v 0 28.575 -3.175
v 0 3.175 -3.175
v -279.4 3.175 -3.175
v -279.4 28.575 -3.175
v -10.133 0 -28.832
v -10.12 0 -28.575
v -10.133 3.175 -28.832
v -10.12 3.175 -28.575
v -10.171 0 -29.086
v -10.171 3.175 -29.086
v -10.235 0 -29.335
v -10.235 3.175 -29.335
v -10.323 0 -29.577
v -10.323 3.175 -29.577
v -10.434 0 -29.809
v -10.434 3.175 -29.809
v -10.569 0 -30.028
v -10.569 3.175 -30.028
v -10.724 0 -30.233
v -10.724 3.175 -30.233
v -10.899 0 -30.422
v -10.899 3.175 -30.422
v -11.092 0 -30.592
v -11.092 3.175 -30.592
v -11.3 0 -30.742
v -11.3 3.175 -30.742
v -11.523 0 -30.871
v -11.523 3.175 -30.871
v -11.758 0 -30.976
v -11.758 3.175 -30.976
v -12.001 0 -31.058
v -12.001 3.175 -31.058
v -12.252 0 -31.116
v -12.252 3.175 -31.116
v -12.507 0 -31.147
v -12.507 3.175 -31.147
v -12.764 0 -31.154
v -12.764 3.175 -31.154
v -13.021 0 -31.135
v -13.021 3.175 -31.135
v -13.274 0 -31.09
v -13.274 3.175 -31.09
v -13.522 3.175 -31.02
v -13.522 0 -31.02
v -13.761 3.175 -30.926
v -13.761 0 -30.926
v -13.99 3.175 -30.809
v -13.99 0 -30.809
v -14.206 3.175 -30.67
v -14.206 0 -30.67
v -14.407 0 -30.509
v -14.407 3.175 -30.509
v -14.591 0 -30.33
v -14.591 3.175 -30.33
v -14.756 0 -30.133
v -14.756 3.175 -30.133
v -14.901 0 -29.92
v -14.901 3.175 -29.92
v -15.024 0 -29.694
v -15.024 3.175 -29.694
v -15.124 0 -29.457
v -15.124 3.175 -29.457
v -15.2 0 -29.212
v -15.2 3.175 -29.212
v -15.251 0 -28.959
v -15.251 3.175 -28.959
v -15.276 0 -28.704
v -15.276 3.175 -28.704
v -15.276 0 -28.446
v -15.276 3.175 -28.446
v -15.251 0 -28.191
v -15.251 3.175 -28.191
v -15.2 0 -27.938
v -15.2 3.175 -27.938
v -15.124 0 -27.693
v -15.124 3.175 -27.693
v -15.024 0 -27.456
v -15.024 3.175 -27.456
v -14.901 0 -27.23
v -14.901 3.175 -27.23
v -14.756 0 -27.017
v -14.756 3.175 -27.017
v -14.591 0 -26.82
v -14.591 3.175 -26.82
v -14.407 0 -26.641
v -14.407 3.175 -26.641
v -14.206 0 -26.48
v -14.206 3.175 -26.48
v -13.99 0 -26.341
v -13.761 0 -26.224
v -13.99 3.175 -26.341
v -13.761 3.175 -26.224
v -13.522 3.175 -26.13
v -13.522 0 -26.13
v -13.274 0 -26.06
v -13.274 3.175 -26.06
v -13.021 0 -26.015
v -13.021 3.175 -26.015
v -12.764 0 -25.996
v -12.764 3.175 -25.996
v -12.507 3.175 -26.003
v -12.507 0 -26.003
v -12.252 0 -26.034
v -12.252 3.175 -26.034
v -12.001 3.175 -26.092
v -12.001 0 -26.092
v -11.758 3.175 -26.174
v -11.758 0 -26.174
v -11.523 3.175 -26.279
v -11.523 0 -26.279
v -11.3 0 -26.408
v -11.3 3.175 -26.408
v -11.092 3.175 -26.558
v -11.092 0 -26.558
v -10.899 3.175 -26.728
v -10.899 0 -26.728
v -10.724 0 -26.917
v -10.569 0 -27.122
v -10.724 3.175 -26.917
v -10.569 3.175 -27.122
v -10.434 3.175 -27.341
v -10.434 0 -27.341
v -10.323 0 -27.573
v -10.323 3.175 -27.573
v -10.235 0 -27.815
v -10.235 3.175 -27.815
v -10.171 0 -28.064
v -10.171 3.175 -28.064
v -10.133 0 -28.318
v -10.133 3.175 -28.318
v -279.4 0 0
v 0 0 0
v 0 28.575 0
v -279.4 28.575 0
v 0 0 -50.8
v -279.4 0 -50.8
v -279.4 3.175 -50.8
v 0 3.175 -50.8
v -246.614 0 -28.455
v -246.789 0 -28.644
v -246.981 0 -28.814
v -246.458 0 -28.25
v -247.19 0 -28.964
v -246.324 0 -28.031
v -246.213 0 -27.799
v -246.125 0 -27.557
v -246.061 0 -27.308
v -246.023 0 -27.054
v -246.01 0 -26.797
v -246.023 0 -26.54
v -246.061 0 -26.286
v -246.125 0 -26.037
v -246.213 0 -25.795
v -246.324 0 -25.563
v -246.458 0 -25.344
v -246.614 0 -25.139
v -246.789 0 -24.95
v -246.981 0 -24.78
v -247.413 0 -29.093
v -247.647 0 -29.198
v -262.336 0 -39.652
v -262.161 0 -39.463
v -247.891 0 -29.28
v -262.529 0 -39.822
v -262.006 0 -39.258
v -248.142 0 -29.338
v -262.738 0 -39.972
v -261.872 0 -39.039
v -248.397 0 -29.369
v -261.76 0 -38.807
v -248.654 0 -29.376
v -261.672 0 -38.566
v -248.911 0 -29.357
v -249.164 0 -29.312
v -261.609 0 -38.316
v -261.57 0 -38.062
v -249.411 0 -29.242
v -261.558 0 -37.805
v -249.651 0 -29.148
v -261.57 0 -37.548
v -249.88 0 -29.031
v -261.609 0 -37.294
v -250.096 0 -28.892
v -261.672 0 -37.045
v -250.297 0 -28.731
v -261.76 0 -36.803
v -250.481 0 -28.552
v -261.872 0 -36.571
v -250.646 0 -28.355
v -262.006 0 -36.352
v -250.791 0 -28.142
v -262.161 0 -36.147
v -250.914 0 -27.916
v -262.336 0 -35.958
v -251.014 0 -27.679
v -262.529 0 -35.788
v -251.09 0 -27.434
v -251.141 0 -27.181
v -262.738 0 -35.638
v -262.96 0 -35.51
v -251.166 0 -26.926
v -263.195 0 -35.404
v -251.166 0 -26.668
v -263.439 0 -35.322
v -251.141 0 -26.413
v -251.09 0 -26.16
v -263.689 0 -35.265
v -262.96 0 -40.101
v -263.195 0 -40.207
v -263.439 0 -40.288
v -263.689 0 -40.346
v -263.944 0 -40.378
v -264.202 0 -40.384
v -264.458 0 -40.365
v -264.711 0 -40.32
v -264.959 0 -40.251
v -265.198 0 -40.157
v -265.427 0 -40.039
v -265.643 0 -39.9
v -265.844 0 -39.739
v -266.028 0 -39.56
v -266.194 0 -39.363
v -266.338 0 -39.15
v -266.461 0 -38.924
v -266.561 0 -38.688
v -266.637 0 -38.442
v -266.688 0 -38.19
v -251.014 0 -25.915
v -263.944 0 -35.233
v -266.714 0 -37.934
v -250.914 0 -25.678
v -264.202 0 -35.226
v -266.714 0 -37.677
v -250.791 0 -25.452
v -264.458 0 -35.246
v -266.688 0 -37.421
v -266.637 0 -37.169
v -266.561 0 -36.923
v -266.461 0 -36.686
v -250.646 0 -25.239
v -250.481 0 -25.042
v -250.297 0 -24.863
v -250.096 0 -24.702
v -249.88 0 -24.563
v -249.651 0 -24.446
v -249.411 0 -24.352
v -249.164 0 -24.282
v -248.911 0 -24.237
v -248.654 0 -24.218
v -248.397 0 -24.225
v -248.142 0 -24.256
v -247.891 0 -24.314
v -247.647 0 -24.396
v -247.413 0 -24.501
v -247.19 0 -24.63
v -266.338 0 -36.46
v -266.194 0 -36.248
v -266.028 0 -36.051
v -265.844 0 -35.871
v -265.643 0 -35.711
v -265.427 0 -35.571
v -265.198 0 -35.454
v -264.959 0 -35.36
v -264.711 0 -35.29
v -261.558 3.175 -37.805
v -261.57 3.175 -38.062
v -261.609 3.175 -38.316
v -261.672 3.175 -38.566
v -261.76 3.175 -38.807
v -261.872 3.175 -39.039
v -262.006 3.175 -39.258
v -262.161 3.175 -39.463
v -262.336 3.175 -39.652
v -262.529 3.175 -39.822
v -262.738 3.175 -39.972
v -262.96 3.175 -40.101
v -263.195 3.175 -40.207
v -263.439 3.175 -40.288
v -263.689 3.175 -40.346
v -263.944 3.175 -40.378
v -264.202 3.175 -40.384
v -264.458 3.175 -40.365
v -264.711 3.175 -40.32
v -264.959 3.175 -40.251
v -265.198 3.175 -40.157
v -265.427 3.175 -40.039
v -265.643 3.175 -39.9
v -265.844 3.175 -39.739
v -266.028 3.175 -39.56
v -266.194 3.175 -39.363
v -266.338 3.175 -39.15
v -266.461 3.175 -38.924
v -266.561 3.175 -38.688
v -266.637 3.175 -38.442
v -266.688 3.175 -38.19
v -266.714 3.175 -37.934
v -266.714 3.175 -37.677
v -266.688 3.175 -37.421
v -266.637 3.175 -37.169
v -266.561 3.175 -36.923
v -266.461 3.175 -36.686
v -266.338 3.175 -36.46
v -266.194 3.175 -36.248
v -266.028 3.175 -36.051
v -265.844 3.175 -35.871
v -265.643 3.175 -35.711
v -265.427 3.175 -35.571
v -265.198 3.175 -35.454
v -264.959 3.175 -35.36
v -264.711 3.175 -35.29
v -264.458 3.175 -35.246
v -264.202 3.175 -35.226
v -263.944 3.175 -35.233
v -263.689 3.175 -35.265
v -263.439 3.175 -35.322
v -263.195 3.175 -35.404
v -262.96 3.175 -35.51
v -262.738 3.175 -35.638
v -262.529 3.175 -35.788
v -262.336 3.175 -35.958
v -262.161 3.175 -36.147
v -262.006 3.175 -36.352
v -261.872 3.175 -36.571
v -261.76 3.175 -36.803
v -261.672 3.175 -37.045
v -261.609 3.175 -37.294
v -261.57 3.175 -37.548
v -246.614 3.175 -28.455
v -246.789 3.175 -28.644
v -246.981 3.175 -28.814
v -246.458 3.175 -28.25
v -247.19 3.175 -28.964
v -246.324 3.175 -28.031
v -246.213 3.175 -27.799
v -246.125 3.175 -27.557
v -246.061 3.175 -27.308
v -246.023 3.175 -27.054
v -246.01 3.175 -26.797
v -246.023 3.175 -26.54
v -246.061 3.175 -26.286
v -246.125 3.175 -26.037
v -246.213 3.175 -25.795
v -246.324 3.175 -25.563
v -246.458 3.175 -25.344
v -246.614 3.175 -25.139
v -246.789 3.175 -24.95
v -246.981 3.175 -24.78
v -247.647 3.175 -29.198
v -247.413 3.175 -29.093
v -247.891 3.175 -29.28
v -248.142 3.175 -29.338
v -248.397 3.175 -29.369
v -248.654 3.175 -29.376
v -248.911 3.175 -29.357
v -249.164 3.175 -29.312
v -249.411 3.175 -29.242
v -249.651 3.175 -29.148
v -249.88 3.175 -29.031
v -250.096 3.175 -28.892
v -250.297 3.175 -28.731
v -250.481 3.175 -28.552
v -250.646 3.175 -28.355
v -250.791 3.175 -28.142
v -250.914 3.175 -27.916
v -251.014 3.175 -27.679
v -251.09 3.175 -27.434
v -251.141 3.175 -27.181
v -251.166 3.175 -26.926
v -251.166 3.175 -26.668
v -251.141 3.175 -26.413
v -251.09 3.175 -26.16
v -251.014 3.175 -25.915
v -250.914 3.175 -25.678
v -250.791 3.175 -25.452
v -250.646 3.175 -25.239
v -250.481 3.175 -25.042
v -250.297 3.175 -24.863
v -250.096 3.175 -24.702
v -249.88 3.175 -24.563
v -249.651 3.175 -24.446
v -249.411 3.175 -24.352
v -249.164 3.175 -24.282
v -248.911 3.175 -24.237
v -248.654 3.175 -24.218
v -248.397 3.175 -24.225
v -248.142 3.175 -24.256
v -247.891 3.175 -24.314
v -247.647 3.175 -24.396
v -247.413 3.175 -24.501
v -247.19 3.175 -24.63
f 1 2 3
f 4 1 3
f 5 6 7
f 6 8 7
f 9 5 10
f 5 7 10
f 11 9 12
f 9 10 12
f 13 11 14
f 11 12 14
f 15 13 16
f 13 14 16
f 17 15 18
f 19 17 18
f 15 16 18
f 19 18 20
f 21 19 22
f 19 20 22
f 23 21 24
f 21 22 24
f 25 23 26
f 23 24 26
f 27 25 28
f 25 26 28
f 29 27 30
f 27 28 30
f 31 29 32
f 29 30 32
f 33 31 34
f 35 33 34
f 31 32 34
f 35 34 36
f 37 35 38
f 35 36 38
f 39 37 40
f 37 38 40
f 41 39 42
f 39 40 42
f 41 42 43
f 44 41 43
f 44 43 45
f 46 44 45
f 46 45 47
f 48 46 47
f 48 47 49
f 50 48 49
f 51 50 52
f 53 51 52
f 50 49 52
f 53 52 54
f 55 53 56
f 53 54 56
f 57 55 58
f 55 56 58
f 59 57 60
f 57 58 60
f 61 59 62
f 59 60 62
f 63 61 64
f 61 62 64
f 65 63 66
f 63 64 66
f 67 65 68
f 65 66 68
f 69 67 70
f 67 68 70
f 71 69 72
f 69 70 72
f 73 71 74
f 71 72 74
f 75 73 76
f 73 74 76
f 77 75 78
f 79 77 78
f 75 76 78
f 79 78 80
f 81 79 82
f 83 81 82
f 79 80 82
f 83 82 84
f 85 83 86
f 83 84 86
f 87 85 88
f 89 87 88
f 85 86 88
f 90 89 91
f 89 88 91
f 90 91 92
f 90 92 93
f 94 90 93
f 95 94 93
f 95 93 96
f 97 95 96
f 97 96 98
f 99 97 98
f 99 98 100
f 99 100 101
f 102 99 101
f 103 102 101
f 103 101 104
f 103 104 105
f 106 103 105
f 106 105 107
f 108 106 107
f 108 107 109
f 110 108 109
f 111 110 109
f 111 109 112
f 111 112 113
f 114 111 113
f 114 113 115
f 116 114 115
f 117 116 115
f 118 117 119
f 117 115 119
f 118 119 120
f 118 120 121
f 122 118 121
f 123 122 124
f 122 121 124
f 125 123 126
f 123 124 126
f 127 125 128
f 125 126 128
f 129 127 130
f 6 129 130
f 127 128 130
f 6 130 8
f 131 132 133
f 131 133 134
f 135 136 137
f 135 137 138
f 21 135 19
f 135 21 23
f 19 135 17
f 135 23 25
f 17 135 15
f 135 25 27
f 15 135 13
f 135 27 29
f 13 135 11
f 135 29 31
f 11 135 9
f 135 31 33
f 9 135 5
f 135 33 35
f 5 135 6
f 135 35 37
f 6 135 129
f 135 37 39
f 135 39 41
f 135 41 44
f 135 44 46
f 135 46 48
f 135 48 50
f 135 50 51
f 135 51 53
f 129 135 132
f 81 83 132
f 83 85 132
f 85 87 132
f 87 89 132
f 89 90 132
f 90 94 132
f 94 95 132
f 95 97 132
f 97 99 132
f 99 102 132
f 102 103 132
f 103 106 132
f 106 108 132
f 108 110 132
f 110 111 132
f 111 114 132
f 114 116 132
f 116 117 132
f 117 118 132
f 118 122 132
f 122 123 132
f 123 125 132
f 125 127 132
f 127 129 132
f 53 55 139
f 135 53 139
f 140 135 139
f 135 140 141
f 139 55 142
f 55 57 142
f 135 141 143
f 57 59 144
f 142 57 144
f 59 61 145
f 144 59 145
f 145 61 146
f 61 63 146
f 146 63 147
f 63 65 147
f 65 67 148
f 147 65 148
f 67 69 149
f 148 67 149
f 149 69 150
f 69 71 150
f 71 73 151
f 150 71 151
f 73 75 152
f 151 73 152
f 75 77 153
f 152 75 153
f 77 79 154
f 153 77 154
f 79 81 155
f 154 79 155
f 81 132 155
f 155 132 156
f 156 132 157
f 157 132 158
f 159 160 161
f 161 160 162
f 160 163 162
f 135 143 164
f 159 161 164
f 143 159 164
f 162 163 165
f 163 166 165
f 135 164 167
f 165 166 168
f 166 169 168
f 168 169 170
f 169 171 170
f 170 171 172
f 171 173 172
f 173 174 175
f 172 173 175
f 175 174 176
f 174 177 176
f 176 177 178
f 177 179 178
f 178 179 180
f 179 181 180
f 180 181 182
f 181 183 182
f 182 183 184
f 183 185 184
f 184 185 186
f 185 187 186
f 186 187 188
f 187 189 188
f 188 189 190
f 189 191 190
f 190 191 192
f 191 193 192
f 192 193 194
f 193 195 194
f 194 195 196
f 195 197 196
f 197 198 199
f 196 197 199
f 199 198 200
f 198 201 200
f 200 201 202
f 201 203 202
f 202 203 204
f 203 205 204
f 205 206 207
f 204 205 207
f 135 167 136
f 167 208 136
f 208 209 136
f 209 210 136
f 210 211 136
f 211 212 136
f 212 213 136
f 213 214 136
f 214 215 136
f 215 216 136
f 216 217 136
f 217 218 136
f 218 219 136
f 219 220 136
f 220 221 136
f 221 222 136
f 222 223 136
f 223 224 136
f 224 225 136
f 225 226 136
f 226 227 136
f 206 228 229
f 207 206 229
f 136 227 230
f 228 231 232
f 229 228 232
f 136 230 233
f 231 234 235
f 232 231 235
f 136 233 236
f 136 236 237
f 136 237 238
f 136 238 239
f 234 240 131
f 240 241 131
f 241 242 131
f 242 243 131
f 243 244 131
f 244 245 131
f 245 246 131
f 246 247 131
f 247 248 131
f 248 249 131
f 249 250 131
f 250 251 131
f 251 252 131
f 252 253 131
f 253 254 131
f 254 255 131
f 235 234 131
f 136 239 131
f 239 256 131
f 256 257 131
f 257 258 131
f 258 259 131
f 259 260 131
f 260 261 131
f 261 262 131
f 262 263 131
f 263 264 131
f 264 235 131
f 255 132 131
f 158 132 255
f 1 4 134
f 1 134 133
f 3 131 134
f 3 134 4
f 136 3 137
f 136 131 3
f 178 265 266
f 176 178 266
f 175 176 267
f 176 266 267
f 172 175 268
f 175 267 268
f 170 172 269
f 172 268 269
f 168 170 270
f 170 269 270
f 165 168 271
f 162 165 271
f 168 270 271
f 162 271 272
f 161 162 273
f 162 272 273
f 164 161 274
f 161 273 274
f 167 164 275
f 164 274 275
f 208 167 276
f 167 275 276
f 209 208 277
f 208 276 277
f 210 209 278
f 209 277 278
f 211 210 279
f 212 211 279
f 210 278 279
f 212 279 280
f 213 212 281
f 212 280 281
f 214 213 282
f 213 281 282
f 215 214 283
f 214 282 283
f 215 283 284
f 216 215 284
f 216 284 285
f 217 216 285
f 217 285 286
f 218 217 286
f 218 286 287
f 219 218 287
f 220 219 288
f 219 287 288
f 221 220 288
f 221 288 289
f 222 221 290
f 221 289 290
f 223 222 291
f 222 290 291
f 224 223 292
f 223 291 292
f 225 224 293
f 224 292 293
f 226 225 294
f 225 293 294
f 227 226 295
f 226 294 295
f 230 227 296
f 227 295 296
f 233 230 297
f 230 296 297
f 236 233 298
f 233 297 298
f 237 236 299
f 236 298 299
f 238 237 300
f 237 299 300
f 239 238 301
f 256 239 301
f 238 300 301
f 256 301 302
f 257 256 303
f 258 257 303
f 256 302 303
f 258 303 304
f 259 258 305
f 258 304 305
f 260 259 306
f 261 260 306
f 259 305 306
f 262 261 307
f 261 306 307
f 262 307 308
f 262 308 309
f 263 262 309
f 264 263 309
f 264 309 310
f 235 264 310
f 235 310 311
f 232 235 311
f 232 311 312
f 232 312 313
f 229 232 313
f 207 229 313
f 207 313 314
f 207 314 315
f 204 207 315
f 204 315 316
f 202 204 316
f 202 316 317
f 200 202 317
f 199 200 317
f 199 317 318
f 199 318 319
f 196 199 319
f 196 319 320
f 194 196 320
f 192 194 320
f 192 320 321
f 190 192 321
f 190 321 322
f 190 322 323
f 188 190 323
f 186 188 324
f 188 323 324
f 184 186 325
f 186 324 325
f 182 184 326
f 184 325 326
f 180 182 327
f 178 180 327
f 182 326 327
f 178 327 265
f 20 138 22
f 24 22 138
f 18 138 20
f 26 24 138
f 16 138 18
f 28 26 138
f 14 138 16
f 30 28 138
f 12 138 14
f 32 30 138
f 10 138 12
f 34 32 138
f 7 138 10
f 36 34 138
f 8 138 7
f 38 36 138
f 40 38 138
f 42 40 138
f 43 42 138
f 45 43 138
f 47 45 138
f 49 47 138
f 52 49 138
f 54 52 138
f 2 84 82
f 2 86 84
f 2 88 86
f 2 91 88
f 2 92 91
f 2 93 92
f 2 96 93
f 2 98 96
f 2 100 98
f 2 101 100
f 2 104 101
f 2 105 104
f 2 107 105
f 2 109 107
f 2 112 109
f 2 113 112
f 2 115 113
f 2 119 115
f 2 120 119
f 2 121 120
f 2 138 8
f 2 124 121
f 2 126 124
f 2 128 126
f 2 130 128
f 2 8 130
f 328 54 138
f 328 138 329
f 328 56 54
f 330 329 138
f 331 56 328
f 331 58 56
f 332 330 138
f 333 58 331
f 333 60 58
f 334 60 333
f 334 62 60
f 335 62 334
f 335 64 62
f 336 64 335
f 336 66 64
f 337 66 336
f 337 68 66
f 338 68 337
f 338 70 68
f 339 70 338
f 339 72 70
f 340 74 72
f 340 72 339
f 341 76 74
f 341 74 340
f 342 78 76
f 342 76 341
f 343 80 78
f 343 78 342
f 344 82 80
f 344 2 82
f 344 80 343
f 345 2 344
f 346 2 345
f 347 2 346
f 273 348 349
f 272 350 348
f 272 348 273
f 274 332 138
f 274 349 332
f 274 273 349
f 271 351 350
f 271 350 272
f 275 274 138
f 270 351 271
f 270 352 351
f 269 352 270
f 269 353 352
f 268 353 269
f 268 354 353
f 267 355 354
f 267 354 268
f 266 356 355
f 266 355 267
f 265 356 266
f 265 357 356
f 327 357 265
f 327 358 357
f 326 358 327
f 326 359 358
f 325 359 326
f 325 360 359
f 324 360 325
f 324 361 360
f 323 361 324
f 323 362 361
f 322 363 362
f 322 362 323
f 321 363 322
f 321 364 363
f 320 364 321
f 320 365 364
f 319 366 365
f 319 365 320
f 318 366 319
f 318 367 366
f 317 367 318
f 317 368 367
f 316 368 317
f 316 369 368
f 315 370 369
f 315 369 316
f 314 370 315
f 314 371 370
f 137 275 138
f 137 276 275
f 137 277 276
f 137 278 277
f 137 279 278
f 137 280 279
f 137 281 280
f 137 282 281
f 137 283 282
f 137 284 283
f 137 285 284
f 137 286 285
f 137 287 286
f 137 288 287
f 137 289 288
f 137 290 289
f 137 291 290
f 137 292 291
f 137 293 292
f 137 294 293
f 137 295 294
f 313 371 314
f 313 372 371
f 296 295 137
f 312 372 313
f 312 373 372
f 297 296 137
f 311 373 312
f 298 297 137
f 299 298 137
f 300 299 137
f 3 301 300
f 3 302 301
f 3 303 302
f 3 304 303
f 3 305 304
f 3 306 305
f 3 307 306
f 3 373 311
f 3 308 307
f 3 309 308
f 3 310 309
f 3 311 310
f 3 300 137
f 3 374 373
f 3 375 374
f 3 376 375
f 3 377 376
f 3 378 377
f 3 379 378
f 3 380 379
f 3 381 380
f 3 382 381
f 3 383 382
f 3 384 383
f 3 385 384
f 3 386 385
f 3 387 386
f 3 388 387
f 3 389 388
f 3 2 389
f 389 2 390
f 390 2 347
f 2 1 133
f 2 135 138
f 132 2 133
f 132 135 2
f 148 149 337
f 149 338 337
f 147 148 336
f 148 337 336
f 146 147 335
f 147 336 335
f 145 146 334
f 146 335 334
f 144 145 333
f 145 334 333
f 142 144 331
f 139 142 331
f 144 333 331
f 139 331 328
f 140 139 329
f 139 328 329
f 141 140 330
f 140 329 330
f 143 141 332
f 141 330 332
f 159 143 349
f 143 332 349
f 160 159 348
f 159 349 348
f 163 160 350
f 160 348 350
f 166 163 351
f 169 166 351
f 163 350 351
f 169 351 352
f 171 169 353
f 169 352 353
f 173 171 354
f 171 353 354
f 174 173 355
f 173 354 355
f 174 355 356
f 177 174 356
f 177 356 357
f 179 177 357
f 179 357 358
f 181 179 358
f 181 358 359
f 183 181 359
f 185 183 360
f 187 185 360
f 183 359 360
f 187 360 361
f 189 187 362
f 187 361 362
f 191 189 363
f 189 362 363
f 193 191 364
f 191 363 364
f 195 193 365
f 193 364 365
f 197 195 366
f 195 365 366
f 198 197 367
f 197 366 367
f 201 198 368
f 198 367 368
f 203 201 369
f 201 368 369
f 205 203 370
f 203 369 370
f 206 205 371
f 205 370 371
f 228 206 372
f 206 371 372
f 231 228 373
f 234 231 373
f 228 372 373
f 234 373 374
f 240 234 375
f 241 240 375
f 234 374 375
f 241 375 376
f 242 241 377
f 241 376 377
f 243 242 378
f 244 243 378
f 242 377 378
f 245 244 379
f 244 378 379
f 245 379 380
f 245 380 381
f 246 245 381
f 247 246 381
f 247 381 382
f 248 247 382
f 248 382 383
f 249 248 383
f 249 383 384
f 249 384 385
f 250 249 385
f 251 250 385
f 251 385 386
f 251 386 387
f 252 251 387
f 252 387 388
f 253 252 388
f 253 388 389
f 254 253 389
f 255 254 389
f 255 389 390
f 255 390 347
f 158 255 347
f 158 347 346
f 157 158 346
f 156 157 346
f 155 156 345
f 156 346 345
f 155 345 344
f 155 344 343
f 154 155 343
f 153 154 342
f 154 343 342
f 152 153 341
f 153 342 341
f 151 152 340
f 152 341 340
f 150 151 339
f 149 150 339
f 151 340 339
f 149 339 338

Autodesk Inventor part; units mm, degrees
ref_plane "YZ Plane" through (0, 0, 0) normal (1, 0, 0) x (0, 1, 0)
ref_plane "XZ Plane" through (0, 0, 0) normal (0, 1, 0) x (-1, 0, 0)
ref_plane "XY Plane" through (0, 0, 0) normal (0, 0, 1) x (1, 0, 0)
sketch "Sketch1" plane through (0, 0, 0) normal (0, 1, 0) x (-1, 0, 0)
  line L0 (0, 0) -> (279.4, 0)
  line L1 (279.4, 0) -> (279.4, -50.8)
  line L2 (279.4, -50.8) -> (0, -50.8)
  line L3 (0, -50.8) -> (0, 0)
  dimension "d0" = 279.4
  dimension "d1" = 50.8
extrude "Extrusion1" add sketch "Sketch1" along normal blind 3.175
sketch "Sketch2" plane through (0, 3.175, 0) normal (0, 1, 0) x (1, 0, 0)
  line L0 (-279.4, 0) -> (0, 0) projected
  line L1 (-279.4, 0) -> (0, 0)
  line L2 (0, 0) -> (0, 3.175)
  line L3 (0, 3.175) -> (-279.4, 3.175)
  line L4 (-279.4, 3.175) -> (-279.4, 0)
  dimension "d4" = 279.4
  dimension "d5" = 3.175
extrude "Extrusion2" add sketch "Sketch2" along normal blind 25.4
sketch "Sketch3" plane through (0, 3.175, 0) normal (0, 1, 0) x (1, 0, 0)
  line L0 (0, 3.175) -> (0, 50.8) construction
  line L1 (0, 50.8) -> (-279.4, 50.8) construction
  line L2 (-139.7, 50.8) -> (-139.7, 9.398) construction
  line L3 (-279.4, 50.8) -> (-248.5898, 50.8) construction
  line L4 (-248.5898, 50.8) -> (-248.5898, 26.797) construction
  circle A0 centre (-248.5898, 26.797) radius 2.5797
  line L5 (-248.5898, 26.797) -> (-264.1372, 37.8052) construction
  circle A1 centre (-264.1372, 37.8052) radius 2.5797
  point P0 (0, 0)
extrude "Extrusion3" cut sketch "Sketch3" against normal blind 25.4
sketch "Sketch4" plane through (0, 3.175, 0) normal (0, 1, 0) x (1, 0, 0)
  line L0 (0, 3.175) -> (0, 50.8) construction
  line L1 (0, 50.8) -> (-279.4, 50.8) construction
  line L2 (0, 23.1034) -> (-12.7, 23.1034) construction
  line L3 (-12.7, 50.8) -> (-12.7, 28.575) construction
  circle A0 centre (-12.7, 28.575) radius 2.5797
  point P0 (0, 0)
  dimension "d26" = 12.7
  dimension "d27" = 22.225
  dimension "d28" = 5.1594
extrude "Extrusion4" cut sketch "Sketch4" against normal blind 25.4
properties part number "angle iron with  holes 2"
